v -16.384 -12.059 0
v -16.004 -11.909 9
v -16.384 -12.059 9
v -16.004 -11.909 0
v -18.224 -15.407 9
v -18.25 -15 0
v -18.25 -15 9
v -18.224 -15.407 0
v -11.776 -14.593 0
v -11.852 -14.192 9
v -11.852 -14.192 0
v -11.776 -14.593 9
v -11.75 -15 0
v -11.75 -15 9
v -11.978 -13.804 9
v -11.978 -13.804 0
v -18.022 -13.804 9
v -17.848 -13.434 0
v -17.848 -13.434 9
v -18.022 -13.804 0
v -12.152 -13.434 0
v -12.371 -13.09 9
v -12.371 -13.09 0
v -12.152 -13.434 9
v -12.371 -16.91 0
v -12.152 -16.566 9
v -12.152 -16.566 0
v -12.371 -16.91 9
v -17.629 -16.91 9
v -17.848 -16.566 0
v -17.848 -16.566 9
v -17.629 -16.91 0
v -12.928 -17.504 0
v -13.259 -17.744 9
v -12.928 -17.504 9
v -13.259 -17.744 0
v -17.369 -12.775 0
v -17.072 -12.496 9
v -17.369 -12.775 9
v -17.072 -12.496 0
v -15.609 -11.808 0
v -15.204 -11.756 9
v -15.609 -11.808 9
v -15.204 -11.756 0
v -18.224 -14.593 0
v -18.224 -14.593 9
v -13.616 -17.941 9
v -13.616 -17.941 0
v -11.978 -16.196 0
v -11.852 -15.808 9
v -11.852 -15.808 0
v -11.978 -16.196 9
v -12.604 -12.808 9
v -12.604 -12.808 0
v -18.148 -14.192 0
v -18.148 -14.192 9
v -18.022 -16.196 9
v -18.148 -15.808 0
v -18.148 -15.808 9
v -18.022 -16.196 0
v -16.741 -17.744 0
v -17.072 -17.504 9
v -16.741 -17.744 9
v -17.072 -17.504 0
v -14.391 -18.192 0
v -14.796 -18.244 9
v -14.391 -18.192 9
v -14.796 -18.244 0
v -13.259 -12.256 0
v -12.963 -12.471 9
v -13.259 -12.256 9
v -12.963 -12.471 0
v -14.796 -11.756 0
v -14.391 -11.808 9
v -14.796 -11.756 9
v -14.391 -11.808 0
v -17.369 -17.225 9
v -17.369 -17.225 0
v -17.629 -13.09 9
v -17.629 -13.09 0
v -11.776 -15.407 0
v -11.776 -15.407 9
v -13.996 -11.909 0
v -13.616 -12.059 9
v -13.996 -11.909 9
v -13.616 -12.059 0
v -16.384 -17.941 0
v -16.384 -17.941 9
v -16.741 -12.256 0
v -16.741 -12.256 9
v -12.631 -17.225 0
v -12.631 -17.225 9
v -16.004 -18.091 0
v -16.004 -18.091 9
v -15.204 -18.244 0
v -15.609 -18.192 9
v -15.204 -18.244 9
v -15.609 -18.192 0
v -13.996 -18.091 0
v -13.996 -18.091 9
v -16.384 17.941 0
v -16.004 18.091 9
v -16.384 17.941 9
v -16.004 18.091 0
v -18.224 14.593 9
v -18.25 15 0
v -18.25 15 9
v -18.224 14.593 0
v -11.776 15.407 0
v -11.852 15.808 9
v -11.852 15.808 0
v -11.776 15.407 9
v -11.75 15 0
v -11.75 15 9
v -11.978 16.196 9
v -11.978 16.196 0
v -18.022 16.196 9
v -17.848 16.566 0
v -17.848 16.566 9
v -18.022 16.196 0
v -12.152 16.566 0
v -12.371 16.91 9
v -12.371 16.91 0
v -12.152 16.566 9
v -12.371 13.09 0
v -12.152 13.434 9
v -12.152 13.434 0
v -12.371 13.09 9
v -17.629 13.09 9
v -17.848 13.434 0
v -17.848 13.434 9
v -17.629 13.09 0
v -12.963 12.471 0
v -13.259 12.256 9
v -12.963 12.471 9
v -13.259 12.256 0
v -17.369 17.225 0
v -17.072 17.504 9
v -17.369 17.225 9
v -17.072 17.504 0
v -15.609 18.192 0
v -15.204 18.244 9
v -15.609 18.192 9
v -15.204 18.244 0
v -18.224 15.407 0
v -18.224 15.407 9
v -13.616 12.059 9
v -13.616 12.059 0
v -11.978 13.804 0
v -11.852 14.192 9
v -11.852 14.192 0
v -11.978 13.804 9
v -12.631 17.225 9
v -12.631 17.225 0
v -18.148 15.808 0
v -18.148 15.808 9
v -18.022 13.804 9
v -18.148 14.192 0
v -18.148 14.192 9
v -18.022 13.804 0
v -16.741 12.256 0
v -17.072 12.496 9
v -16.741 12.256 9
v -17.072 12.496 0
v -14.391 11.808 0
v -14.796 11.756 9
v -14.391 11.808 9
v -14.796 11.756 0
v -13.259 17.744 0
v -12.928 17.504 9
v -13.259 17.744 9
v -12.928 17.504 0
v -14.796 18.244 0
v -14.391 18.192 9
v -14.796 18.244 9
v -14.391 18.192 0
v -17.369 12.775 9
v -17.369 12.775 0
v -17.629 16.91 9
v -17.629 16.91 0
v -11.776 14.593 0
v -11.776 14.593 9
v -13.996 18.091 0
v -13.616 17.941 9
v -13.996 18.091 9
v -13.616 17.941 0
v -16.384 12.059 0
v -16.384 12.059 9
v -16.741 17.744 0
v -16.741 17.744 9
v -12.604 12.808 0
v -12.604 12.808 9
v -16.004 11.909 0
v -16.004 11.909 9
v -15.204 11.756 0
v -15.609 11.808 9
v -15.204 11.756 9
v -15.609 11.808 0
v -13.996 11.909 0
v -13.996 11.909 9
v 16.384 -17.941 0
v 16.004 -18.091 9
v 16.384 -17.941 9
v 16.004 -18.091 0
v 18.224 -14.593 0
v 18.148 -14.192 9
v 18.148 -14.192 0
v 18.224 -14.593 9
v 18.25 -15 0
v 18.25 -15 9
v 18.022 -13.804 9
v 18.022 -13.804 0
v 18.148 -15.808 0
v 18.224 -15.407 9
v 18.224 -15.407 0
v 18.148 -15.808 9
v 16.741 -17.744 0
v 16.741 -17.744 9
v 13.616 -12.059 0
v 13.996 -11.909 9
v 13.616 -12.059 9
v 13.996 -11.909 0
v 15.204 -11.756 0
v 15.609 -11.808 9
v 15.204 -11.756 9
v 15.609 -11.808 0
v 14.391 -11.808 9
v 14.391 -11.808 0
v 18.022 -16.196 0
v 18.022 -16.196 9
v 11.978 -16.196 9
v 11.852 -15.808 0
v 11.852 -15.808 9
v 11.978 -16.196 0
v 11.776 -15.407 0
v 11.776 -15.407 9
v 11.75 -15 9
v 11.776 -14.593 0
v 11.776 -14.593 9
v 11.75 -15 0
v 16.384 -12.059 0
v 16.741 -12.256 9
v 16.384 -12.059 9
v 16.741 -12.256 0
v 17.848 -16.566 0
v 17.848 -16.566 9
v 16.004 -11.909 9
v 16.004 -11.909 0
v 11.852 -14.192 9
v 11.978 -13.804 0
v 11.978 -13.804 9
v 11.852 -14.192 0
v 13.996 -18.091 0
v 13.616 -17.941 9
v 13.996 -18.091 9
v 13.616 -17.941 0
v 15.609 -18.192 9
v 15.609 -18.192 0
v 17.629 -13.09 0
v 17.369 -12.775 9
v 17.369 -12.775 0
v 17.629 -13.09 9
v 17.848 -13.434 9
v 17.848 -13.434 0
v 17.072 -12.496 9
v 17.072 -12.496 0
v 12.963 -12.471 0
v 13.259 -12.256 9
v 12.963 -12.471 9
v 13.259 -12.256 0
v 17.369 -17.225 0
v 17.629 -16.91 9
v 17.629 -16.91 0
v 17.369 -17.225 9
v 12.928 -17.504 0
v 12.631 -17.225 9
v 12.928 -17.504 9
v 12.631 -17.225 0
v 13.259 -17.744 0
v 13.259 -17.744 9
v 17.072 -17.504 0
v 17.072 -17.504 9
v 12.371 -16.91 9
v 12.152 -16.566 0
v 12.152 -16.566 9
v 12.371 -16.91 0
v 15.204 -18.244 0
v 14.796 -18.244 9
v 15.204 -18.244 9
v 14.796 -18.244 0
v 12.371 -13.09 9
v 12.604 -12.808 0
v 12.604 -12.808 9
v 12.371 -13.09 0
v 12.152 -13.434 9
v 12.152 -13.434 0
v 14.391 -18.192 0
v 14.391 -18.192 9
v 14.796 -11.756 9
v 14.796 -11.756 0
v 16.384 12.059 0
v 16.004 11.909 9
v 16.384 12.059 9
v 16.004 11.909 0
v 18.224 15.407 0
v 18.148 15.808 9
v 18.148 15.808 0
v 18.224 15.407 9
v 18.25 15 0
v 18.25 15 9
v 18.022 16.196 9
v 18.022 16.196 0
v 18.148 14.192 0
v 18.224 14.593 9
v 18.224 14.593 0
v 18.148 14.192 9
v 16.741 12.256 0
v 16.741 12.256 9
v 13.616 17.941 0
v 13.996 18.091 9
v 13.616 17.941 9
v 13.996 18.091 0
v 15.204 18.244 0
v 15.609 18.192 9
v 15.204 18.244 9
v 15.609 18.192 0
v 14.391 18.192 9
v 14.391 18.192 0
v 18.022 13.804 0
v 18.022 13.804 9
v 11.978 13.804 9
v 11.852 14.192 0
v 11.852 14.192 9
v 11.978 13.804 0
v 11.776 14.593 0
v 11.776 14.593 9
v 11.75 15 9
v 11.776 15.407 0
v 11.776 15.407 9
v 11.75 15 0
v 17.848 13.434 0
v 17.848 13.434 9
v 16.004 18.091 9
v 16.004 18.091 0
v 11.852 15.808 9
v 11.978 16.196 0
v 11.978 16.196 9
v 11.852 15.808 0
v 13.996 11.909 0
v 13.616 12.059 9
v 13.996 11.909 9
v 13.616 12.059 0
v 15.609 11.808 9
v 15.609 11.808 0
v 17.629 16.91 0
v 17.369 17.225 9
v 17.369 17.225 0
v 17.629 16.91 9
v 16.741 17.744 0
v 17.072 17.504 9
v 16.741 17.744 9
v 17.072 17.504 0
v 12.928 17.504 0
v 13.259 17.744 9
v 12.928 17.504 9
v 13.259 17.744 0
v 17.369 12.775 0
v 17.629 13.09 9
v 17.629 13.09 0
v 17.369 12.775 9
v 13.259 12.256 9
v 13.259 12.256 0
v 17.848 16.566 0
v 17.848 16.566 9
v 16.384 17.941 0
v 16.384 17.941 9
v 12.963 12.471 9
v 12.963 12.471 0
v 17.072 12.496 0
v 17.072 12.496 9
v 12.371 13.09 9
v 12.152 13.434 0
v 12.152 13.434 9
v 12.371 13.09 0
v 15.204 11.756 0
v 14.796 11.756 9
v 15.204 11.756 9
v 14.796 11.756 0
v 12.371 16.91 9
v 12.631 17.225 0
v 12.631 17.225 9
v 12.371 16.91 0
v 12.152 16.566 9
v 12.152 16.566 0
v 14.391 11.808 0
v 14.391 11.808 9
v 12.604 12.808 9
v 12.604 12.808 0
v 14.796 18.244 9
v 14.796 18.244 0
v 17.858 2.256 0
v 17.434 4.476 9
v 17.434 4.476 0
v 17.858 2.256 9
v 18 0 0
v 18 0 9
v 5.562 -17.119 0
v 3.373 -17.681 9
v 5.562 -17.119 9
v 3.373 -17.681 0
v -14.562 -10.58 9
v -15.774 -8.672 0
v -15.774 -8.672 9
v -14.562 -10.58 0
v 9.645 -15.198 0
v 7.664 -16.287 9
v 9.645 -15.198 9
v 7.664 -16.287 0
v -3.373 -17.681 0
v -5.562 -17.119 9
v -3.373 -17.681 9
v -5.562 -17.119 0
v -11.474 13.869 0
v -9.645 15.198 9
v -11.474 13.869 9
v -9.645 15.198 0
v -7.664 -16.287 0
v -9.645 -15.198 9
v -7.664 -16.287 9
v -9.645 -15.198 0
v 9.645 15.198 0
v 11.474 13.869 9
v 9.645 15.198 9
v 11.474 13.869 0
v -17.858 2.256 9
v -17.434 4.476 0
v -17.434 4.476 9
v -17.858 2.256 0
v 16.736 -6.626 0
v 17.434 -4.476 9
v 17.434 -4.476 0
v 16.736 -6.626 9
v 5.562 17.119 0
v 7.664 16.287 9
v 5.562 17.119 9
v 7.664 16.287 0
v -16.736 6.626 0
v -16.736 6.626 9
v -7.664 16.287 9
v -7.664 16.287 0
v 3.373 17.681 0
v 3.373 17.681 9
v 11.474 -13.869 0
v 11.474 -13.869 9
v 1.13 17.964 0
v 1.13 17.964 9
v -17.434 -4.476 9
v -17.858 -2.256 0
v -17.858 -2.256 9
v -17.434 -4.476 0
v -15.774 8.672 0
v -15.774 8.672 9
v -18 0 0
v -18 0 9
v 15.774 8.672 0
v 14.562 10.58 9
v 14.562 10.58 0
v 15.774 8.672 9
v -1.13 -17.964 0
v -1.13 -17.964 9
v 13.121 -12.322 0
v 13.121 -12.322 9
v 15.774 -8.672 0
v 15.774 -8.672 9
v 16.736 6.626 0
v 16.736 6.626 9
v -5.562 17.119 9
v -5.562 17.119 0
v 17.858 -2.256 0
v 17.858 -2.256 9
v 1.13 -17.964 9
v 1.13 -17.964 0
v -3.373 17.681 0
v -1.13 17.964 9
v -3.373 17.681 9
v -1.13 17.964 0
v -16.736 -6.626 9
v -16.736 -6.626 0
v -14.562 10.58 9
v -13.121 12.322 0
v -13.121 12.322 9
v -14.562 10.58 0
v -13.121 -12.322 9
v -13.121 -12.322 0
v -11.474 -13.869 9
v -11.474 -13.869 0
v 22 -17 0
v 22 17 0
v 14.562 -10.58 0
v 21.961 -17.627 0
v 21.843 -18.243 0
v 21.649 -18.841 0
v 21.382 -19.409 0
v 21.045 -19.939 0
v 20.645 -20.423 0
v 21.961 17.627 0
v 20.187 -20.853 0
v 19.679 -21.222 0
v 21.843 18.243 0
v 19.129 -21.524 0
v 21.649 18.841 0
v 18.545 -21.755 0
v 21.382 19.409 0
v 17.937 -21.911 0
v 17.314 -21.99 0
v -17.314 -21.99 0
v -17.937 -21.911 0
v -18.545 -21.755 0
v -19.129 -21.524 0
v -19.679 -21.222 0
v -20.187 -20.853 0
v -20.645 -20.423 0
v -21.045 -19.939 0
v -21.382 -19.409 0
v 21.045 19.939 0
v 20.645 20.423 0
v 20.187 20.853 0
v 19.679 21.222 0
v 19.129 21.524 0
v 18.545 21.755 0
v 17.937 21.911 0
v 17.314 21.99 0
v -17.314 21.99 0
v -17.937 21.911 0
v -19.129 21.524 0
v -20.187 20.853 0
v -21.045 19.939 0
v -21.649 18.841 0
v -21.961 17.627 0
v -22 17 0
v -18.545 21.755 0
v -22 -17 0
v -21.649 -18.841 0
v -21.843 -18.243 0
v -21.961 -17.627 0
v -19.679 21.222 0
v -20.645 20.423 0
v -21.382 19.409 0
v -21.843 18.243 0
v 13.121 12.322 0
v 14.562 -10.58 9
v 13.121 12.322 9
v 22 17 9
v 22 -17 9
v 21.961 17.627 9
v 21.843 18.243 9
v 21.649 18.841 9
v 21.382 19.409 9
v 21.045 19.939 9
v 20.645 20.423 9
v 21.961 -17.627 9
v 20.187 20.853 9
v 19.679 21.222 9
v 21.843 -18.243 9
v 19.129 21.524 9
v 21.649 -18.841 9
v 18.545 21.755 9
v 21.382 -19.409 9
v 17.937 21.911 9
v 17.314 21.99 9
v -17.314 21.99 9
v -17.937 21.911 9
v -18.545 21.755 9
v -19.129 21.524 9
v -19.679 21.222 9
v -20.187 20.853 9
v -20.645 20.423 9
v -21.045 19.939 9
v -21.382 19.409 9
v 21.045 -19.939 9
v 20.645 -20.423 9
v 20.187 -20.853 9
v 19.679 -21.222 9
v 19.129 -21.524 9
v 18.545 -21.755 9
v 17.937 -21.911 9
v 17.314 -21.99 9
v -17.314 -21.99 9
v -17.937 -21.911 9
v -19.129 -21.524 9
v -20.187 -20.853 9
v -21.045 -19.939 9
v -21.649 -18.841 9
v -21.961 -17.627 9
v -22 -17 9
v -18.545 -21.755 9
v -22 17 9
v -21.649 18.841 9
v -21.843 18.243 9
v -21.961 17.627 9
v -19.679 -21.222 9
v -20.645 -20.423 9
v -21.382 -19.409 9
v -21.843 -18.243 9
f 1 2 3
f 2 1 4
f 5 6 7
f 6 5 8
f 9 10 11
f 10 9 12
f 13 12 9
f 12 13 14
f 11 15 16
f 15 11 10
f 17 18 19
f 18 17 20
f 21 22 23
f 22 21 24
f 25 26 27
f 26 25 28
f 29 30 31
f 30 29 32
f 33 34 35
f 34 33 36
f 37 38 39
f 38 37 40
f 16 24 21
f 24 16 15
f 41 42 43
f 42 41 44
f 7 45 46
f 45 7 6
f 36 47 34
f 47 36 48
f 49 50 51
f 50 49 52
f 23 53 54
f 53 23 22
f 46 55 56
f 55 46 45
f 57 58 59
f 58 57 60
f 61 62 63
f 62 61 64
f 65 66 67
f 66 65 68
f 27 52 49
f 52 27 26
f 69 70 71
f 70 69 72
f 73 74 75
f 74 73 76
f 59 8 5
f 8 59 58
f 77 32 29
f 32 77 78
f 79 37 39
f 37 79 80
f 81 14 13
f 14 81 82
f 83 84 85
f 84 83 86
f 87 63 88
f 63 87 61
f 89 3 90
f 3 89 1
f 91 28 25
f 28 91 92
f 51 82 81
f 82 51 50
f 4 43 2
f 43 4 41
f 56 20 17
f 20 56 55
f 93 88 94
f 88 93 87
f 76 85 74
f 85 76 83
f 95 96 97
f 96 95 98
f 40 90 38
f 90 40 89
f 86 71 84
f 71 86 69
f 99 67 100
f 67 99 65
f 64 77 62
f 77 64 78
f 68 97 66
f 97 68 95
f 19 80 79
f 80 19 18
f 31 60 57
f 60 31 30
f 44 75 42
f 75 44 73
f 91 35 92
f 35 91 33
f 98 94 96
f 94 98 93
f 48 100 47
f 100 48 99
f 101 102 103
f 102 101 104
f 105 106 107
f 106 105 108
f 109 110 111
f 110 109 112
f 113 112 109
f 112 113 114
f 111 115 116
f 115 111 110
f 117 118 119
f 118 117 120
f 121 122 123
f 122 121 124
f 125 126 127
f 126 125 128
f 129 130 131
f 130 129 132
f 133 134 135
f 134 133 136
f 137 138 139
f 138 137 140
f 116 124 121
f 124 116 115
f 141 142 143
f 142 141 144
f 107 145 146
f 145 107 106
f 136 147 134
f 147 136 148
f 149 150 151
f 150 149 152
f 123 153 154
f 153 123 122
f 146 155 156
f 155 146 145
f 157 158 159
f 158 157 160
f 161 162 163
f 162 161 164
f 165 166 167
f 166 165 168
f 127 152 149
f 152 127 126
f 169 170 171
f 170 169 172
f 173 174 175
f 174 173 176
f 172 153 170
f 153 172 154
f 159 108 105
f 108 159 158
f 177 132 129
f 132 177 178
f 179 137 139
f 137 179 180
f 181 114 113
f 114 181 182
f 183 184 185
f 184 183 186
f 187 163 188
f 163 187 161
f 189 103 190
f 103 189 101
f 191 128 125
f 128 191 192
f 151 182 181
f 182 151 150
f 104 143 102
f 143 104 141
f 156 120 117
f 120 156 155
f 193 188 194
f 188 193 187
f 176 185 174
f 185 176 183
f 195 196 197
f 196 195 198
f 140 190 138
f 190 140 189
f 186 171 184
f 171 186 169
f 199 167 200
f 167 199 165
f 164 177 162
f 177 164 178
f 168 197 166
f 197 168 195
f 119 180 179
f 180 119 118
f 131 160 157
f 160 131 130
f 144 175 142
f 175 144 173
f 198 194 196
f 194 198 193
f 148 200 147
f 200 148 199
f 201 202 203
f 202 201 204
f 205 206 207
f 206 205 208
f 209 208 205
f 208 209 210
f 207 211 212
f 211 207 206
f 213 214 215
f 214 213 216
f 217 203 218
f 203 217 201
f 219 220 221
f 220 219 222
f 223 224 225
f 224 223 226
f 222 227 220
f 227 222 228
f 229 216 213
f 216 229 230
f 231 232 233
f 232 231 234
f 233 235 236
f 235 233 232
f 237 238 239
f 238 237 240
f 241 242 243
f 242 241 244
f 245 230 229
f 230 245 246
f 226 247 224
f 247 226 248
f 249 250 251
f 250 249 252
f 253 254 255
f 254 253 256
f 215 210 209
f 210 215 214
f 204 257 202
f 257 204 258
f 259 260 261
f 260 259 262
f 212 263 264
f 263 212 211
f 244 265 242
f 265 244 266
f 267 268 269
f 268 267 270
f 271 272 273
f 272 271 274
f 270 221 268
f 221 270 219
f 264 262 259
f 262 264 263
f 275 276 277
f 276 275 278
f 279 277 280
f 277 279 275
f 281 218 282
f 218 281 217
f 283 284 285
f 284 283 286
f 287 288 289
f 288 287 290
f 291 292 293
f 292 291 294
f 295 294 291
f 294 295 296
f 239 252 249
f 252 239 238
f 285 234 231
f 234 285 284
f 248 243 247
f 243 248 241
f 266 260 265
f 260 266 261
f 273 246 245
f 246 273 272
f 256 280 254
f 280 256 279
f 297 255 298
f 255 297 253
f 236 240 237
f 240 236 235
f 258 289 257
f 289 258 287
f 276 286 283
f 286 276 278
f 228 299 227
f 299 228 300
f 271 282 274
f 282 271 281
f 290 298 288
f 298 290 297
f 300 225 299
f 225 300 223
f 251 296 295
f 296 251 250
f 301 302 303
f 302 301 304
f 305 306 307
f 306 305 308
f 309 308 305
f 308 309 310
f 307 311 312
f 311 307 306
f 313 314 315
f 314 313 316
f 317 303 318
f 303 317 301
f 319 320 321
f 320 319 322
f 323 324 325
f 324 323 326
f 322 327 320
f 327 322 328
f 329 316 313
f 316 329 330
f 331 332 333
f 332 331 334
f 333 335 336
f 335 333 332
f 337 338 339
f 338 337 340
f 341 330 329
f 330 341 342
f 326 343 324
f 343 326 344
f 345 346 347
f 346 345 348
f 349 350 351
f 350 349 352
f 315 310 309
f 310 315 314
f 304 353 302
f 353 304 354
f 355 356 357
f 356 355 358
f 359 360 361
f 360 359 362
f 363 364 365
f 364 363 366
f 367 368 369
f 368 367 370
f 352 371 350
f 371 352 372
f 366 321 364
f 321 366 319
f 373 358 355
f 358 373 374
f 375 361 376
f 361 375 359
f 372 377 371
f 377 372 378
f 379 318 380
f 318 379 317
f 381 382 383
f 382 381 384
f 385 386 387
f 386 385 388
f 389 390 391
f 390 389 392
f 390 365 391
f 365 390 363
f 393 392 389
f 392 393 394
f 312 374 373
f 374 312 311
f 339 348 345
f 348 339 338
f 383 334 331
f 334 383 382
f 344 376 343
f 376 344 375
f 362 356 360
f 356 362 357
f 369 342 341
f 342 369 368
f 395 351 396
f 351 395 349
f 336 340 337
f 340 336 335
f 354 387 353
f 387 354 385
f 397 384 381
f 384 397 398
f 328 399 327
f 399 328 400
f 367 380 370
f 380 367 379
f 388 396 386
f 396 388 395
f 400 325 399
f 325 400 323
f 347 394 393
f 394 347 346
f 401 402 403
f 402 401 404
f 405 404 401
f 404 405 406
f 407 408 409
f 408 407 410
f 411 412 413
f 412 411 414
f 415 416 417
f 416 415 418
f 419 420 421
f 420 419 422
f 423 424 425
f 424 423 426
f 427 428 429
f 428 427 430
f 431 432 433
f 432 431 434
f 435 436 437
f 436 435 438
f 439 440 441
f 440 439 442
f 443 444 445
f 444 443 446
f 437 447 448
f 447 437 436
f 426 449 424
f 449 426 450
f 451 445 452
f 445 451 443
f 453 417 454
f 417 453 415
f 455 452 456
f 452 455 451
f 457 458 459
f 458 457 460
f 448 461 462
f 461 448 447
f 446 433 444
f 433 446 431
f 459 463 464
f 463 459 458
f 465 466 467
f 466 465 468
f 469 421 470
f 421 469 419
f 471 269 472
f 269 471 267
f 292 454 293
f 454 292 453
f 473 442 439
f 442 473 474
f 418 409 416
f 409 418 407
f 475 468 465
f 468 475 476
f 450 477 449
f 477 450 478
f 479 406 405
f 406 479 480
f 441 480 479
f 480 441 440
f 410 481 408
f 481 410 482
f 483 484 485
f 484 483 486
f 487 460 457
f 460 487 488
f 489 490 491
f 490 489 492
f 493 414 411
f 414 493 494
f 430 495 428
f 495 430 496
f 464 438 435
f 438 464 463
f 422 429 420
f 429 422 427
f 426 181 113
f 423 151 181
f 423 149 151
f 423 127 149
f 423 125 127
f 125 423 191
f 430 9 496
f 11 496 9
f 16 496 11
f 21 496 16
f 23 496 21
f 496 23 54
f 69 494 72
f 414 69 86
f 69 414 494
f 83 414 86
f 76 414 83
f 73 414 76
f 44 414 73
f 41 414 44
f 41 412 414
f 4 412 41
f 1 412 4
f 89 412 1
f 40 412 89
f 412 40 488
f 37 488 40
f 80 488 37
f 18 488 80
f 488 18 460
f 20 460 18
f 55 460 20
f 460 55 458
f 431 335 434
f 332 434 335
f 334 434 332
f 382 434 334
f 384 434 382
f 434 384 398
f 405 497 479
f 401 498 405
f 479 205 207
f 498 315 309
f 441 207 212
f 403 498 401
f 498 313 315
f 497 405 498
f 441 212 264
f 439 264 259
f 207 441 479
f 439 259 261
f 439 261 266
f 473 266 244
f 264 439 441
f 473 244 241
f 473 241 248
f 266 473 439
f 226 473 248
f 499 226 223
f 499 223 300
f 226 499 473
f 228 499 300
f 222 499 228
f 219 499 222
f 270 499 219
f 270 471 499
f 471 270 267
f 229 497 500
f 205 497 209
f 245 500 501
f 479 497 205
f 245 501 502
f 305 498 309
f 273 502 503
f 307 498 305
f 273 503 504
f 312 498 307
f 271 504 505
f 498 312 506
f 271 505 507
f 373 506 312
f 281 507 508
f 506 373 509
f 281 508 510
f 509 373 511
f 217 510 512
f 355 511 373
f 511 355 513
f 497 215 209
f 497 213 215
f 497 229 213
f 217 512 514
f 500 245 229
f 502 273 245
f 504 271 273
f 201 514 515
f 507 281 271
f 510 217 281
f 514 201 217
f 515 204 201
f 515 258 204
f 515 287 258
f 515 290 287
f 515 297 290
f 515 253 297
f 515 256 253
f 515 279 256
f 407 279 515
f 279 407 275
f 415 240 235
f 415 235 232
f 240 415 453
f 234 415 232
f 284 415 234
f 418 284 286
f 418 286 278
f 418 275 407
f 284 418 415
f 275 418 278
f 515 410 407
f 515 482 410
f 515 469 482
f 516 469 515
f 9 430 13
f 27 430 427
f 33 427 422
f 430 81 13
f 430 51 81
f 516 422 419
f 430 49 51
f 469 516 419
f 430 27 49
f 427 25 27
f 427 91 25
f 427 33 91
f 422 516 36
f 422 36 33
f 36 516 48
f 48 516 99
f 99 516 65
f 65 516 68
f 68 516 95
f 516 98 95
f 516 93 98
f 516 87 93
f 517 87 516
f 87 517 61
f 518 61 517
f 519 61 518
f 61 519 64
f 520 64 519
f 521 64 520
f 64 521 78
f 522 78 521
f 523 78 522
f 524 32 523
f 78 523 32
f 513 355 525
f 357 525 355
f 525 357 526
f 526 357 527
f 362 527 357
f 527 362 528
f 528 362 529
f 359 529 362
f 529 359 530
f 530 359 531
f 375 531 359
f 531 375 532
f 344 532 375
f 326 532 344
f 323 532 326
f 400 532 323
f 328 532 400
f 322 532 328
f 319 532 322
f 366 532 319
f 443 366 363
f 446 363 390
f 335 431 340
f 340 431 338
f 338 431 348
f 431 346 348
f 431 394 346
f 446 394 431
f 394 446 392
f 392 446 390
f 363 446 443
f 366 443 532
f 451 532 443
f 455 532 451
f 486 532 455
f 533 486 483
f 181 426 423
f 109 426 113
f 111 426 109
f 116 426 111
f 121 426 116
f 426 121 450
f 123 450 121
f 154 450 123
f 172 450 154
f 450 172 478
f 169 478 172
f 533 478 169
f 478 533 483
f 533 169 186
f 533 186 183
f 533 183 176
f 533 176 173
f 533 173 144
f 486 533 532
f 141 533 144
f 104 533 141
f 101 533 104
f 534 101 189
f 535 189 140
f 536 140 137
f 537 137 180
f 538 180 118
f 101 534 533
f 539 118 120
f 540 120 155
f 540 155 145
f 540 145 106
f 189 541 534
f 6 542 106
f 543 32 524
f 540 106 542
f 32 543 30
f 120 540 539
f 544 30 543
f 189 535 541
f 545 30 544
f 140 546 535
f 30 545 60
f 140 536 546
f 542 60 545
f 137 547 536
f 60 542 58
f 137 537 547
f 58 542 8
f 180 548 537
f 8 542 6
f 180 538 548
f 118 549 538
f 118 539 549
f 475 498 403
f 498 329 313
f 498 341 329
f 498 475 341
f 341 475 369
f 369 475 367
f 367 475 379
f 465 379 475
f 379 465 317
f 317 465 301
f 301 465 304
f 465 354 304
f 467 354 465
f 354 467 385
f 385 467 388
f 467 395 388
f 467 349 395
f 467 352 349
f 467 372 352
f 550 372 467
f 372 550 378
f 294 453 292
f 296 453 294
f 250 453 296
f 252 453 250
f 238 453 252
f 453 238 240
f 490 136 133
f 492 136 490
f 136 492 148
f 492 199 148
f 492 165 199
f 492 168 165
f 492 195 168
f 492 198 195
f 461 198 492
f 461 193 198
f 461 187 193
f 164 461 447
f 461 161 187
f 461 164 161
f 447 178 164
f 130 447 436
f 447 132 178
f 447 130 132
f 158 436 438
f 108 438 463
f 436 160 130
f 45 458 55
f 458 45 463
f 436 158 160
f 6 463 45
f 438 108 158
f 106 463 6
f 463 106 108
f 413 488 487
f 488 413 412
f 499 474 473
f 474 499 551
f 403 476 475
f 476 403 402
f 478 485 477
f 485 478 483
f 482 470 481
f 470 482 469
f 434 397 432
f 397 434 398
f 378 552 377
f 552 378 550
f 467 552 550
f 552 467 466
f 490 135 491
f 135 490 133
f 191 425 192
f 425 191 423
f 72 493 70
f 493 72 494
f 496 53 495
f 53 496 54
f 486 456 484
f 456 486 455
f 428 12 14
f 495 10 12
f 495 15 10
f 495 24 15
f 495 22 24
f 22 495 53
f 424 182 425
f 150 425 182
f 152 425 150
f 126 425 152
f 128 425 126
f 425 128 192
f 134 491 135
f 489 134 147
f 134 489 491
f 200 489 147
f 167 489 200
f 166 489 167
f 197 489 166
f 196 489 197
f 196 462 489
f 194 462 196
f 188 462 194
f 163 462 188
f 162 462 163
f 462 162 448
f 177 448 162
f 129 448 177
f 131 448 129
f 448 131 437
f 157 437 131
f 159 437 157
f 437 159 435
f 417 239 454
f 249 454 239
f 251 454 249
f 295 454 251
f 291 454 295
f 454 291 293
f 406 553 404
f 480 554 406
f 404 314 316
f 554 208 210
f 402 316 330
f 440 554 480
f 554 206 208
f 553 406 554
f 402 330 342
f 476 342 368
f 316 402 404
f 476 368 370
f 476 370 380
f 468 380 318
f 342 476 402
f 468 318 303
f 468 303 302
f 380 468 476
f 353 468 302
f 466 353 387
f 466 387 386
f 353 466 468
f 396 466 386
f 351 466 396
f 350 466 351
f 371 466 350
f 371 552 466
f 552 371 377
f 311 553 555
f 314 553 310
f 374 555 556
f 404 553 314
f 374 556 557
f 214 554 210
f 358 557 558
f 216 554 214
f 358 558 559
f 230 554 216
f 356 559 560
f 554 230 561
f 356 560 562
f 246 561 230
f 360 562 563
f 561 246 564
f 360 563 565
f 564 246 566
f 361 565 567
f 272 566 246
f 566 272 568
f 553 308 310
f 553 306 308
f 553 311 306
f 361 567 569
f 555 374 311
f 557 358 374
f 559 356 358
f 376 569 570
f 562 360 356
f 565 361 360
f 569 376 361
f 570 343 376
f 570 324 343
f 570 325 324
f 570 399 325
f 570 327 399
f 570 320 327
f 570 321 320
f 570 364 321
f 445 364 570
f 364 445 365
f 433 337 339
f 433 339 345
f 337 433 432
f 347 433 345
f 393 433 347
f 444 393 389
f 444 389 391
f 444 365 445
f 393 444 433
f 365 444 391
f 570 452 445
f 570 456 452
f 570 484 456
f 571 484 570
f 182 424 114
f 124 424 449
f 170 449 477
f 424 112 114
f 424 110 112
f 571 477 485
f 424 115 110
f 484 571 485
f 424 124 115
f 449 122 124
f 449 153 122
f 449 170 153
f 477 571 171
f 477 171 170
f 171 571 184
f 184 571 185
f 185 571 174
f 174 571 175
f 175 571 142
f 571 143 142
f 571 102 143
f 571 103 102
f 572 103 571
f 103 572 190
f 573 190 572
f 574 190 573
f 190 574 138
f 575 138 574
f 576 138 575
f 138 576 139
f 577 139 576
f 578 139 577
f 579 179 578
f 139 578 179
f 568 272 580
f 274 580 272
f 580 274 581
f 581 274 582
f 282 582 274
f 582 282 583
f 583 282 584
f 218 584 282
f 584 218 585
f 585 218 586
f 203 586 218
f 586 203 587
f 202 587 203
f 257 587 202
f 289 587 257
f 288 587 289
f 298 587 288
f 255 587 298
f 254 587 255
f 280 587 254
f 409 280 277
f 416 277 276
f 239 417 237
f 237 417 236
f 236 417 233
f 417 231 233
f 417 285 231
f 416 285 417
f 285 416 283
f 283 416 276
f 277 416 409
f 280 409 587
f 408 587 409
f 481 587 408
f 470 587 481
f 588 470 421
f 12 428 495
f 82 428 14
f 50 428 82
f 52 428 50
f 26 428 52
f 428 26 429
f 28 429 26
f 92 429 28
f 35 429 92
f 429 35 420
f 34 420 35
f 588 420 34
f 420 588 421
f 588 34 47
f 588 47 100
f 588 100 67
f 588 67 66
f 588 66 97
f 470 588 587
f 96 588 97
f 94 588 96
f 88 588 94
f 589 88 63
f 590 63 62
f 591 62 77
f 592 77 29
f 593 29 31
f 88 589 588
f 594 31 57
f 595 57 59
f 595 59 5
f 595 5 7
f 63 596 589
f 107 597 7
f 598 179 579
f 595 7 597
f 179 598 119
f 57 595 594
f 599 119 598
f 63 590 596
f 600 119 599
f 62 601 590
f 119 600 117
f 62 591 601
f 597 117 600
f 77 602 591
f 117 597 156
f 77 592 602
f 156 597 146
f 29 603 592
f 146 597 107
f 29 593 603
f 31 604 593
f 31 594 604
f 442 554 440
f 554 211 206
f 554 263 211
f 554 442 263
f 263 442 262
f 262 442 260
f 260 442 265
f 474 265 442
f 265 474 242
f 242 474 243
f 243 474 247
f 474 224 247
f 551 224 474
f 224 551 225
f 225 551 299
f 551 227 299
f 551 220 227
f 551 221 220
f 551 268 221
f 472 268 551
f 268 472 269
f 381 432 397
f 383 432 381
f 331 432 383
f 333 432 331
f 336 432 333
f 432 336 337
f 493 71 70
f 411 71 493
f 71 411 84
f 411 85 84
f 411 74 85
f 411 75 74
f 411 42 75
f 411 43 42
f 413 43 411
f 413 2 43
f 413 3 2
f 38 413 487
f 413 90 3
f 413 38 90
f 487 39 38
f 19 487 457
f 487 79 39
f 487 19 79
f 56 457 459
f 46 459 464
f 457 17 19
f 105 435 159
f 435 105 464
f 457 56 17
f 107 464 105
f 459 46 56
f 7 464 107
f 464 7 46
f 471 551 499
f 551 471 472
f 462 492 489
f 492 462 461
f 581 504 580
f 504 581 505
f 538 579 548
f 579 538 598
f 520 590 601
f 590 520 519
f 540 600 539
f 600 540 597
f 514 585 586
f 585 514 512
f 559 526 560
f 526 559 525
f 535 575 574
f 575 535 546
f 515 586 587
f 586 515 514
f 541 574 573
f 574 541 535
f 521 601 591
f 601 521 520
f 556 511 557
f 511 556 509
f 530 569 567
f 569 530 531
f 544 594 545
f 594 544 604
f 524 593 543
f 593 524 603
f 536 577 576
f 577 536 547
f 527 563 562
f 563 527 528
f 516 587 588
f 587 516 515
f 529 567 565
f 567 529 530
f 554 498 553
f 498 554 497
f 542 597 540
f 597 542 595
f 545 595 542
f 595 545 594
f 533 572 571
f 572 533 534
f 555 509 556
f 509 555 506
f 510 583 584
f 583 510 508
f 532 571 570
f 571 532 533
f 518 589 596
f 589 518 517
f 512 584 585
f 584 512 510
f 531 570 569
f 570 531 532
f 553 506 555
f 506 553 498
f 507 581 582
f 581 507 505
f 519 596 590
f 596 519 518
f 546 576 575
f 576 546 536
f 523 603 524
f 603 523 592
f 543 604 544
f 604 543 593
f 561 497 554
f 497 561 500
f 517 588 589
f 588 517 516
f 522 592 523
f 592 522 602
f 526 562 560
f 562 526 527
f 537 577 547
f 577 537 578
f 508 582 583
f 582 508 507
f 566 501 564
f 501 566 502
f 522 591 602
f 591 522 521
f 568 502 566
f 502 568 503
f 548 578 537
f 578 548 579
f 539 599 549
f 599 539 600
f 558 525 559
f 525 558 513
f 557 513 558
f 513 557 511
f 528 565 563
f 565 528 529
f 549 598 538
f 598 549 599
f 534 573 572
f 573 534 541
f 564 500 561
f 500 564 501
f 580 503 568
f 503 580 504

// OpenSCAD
$fn = 50;


difference() {
	union() {
		hull() {
			translate(v = [-17.0000000000, 17.0000000000, 0]) {
				cylinder(h = 9, r = 5);
			}
			translate(v = [17.0000000000, 17.0000000000, 0]) {
				cylinder(h = 9, r = 5);
			}
			translate(v = [-17.0000000000, -17.0000000000, 0]) {
				cylinder(h = 9, r = 5);
			}
			translate(v = [17.0000000000, -17.0000000000, 0]) {
				cylinder(h = 9, r = 5);
			}
		}
	}
	union() {
		#translate(v = [-15.0000000000, -15.0000000000, -100.0000000000]) {
			cylinder(h = 200, r = 3.2500000000);
		}
		#translate(v = [-15.0000000000, 15.0000000000, -100.0000000000]) {
			cylinder(h = 200, r = 3.2500000000);
		}
		#translate(v = [15.0000000000, -15.0000000000, -100.0000000000]) {
			cylinder(h = 200, r = 3.2500000000);
		}
		#translate(v = [15.0000000000, 15.0000000000, -100.0000000000]) {
			cylinder(h = 200, r = 3.2500000000);
		}
		#cylinder(h = 9, r = 18.0000000000);
	}
}
